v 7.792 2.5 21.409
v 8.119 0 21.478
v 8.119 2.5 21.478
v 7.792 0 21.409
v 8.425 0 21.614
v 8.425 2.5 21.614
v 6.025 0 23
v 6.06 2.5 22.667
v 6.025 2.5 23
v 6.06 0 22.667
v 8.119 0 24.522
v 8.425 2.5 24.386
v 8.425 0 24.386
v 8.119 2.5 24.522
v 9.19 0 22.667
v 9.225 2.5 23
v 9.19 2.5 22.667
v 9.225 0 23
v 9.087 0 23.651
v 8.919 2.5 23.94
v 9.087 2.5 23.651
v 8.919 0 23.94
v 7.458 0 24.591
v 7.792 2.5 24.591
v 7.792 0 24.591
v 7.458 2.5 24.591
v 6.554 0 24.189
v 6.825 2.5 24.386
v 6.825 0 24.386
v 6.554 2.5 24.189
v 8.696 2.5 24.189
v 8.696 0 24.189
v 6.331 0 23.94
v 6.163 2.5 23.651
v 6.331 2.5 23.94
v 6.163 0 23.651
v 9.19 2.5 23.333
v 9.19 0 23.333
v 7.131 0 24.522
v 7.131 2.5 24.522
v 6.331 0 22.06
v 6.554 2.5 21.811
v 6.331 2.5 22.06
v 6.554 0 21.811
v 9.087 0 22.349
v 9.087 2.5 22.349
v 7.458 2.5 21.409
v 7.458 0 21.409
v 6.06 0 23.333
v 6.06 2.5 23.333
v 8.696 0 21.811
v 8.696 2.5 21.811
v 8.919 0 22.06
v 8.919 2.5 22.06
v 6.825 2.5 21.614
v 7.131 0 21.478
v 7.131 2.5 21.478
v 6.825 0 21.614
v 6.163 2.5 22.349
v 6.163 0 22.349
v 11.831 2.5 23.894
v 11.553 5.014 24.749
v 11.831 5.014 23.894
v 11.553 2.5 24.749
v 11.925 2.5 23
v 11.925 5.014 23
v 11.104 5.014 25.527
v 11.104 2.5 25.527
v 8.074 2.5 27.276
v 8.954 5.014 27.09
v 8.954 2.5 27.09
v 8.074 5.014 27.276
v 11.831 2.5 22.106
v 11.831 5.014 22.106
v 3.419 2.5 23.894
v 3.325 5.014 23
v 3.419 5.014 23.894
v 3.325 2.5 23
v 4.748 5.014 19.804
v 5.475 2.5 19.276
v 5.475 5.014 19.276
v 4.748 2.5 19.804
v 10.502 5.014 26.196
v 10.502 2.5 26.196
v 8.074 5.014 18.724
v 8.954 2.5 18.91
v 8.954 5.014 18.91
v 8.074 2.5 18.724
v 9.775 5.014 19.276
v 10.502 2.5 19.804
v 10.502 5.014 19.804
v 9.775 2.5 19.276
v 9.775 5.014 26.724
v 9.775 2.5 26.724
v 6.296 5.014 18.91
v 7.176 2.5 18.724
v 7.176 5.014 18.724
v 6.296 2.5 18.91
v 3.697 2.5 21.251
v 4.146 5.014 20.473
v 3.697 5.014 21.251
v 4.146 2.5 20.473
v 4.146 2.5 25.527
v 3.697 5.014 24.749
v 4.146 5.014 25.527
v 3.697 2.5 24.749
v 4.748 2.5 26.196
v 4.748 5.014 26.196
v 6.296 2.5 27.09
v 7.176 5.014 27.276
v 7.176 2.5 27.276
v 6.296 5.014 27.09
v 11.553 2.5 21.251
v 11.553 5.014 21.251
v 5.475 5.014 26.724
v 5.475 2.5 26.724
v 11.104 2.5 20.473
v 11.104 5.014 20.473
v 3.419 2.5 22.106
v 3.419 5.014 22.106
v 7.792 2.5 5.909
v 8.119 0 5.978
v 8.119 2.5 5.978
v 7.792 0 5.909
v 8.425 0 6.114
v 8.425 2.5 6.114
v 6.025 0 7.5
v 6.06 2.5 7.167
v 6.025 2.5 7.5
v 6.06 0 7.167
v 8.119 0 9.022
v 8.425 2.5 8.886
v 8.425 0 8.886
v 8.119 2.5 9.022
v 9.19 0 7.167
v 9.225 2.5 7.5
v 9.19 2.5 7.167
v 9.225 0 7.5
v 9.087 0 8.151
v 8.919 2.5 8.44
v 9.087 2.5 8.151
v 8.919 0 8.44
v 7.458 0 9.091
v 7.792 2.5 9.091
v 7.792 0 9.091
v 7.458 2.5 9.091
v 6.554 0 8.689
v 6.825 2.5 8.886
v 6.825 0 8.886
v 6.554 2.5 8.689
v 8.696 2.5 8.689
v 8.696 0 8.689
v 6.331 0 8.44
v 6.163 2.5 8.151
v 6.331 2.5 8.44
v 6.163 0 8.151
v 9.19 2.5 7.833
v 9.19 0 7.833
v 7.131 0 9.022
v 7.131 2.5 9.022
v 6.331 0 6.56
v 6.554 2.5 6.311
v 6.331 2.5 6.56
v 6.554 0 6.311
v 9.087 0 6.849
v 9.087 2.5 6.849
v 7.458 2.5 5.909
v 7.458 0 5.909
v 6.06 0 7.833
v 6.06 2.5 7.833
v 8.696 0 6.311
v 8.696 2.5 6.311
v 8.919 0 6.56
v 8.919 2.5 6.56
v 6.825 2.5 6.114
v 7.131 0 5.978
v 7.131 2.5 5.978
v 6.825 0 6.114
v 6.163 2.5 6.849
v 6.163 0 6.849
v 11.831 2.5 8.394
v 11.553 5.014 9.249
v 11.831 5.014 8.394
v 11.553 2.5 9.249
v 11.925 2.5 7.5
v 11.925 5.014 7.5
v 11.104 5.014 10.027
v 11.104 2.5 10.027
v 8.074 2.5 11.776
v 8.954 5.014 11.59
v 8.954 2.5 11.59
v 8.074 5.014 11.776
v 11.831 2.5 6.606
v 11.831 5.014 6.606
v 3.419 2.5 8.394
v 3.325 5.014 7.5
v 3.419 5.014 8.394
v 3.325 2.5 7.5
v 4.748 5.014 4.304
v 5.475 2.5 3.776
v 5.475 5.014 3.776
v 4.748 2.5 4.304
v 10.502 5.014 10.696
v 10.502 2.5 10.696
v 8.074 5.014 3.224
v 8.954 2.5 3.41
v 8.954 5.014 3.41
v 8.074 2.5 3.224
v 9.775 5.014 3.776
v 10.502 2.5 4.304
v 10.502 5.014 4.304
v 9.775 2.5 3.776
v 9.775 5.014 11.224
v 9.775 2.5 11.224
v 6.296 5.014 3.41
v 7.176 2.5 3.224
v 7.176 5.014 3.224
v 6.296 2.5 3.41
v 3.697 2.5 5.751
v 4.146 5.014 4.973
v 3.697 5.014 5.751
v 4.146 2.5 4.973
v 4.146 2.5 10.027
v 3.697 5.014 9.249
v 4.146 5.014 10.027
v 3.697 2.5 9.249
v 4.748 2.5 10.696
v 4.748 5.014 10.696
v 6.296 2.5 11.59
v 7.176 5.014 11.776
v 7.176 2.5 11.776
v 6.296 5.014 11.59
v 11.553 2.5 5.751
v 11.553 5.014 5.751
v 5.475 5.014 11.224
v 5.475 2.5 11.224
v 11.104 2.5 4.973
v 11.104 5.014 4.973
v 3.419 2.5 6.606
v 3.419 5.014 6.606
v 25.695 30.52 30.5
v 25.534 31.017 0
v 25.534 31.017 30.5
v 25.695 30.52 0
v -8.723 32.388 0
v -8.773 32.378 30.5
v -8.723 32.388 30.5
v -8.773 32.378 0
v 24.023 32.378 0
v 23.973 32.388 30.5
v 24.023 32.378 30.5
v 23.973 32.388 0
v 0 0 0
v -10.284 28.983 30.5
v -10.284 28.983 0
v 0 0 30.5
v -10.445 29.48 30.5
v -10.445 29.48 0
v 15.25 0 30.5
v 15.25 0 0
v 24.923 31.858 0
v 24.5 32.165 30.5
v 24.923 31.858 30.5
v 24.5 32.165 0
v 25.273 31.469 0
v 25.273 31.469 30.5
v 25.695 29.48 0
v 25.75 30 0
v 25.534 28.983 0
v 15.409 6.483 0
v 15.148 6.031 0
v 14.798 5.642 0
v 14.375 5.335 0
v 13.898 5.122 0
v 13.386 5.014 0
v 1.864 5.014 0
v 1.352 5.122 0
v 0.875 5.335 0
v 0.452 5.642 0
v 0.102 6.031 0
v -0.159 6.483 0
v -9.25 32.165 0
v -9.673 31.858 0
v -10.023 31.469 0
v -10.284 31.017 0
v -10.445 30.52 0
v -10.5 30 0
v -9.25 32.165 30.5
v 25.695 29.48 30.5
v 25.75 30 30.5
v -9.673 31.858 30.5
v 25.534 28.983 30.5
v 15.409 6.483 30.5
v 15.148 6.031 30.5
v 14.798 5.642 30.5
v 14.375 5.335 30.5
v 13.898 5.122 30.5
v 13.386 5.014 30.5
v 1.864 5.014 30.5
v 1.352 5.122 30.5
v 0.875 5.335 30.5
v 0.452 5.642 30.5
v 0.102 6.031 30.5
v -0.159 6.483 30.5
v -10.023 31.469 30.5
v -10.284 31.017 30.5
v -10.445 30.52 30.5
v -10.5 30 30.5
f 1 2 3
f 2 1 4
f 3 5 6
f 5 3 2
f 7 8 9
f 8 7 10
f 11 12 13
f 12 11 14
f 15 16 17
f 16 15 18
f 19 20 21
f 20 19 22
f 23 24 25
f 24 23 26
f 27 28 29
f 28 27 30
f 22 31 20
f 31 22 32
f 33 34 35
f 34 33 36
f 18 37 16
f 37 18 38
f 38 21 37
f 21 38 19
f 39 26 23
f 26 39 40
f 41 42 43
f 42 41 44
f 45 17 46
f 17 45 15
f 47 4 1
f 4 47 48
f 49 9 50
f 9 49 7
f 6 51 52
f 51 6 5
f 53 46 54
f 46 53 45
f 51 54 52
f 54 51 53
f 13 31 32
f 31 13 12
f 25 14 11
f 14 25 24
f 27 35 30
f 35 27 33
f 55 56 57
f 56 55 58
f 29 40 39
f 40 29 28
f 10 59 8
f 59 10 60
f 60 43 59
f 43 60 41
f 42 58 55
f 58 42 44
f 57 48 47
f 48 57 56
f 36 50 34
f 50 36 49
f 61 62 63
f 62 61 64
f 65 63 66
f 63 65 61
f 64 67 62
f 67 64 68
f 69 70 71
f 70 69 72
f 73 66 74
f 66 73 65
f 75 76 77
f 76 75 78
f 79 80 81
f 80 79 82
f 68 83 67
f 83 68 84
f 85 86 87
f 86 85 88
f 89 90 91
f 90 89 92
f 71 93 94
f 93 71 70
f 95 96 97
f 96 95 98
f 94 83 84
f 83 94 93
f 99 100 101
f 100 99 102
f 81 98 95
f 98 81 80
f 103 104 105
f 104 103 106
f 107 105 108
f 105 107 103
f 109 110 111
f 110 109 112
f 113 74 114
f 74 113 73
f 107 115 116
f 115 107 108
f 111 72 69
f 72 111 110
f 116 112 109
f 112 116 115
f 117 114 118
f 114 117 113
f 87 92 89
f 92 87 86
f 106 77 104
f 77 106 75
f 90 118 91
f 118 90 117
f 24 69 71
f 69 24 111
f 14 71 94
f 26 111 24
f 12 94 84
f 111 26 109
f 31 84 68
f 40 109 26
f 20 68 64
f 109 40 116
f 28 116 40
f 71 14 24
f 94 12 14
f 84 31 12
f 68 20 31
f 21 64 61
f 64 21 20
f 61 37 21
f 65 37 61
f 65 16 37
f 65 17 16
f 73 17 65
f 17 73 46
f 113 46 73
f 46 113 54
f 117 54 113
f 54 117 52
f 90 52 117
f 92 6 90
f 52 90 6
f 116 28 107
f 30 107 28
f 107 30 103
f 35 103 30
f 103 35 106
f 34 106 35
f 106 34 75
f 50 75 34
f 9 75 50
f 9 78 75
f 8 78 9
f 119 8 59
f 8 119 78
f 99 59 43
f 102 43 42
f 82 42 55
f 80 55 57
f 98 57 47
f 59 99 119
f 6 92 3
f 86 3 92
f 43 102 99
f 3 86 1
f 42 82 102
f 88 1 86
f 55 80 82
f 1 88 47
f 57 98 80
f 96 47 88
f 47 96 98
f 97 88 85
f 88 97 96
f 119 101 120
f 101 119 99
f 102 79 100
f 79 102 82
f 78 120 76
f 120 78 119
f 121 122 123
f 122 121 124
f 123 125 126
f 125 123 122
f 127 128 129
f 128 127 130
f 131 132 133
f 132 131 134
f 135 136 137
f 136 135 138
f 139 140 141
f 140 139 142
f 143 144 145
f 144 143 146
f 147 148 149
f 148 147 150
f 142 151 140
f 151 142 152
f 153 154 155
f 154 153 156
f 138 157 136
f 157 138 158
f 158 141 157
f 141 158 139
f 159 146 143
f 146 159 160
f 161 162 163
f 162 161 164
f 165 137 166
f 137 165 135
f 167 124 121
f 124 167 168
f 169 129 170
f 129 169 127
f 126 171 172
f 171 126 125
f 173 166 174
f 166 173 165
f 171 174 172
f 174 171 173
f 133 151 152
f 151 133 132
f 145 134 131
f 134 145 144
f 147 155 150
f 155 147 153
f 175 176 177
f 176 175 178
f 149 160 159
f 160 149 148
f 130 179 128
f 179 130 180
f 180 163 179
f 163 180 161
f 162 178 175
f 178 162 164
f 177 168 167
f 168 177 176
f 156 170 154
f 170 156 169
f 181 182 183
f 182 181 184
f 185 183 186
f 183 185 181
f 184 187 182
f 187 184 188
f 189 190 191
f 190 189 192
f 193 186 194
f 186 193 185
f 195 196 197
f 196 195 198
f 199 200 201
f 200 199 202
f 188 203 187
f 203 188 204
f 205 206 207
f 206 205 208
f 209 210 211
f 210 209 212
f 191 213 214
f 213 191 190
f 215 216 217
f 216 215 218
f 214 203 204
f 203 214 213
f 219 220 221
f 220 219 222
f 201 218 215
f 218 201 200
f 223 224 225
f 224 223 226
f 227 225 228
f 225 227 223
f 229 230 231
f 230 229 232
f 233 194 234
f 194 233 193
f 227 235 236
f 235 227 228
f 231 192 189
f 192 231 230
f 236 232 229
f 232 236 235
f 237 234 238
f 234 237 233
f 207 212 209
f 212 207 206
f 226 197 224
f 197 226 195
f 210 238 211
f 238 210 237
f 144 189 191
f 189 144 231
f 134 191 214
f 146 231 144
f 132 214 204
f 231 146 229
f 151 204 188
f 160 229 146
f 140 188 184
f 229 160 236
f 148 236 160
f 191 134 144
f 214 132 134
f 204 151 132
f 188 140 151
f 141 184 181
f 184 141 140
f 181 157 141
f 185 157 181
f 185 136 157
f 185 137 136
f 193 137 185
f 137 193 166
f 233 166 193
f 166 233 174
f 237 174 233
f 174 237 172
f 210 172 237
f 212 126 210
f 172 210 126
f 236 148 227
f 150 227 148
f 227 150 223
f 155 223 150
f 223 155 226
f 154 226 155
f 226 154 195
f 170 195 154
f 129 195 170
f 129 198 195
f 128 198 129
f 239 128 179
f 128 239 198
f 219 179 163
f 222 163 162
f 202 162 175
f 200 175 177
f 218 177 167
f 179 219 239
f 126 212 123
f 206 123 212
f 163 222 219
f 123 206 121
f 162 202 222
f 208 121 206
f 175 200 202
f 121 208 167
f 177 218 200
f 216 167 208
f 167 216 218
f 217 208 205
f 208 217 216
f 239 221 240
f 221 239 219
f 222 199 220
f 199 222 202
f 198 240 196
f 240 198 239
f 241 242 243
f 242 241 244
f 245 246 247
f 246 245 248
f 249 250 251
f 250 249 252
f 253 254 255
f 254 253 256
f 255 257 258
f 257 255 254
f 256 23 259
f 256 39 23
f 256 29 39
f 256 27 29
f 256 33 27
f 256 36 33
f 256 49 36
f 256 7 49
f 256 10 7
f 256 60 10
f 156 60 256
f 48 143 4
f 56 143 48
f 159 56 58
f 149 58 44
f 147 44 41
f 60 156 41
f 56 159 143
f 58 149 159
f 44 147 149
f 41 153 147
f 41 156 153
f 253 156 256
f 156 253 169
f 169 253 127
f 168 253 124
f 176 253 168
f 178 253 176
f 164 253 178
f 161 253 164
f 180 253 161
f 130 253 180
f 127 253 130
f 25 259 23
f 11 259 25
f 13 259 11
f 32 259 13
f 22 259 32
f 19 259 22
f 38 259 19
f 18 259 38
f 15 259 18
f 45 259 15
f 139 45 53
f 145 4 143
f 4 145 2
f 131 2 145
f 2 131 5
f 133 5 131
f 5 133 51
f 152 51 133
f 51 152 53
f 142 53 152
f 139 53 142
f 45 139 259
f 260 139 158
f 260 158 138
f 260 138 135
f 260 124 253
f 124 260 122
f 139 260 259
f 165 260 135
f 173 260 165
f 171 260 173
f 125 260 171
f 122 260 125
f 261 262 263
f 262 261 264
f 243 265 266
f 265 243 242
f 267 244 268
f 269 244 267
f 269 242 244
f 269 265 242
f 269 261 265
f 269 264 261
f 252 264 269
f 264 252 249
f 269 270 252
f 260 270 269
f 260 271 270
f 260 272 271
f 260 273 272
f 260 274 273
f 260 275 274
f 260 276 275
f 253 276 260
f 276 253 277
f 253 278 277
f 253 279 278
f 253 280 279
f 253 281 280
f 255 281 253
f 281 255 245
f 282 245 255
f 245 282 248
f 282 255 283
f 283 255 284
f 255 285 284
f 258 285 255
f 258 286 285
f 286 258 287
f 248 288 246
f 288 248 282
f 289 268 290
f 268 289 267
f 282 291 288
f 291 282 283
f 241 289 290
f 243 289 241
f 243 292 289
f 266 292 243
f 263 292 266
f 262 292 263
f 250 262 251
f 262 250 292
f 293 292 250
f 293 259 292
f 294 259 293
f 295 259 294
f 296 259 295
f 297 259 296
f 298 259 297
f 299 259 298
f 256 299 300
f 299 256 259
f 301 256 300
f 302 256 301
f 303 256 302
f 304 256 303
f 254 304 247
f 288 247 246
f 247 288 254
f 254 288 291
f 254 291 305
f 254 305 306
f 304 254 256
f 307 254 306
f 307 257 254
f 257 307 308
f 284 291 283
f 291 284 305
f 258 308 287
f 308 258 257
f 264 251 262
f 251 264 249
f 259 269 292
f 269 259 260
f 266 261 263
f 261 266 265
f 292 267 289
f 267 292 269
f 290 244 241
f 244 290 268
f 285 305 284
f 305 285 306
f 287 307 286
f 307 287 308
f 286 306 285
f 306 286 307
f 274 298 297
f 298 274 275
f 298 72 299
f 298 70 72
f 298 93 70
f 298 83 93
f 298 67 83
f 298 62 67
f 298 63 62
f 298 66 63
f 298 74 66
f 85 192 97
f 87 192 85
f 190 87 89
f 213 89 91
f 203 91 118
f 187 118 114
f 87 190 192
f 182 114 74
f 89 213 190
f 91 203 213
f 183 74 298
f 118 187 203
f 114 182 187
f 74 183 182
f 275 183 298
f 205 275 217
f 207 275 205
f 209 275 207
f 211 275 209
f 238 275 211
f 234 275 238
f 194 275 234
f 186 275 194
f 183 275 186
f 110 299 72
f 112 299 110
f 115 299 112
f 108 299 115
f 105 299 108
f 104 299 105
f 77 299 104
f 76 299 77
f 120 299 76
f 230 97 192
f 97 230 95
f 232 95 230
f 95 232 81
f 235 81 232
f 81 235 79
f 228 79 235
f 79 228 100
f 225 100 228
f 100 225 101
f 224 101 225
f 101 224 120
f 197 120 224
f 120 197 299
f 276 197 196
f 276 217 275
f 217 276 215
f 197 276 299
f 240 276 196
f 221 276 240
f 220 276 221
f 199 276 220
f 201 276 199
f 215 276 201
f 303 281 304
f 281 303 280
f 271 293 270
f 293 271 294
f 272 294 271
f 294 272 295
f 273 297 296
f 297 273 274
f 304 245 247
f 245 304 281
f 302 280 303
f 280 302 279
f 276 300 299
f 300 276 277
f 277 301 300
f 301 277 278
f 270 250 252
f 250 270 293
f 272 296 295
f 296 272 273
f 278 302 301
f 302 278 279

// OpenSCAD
// file: ../parameters.scad
maximum_printable_size = 150;

layer_thickness = 0.3;
global_clearance = 0.5;


//Screw diameter and nut for M10 [mm]
M10_screw_diameter = 10.4;
M10_head_height = 10;
M10_head_diameter = 16+0.5;
M10_nut_height = 10.5;
M10_nut_diameter = 25.5;
M10_nut_pocket = 22.3;

//Screw diameter for M8 [mm]
M8_screw_diameter = 8.6;
M8_head_height = 8;
M8_head_diameter = 13.5;
M8_nut_height = 7.5;
M8_square_nut_thin_height = 4.5;
M8_nut_diameter = 14.4 + 0.5;
M8_nut_pocket = 13 + 0.5;
M8_washer_diameter = 16;
M8_washer_thickness = 1.5;


//Screw diameter and nut for M6 [mm]
M6_screw_diameter=6.5;
M6_head_diameter = 10+0.5;
M6_head_height = 6;
M6_nut_height = 4.9;
M6_nut_diameter = 11.8;
M6_nut_pocket = 10.4;
M6_square_nut_height = 3;
M6_square_nut_diameter = 10;
M6_washer_thickness = 1.6;

//Screw diameter and nut for M5 [mm]
M5_screw_diameter=5.5;
M5_head_height = 5;
M5_head_diameter = 13+0.5;
M5_nut_height = 4.5;
M5_nut_diameter = 9.4;
M5_nut_pocket = 8.4;

//Screw diameter and nut for M4 [mm]
M4_screw_diameter=4.5;
M4_screw_head_height = 4;
M4_nut_height = 3.2;
M4_nut_diameter = 8.4;
M4_nut_pocket = 7.5;

//Screw diameter and nut for M3 [mm]
M3_screw_diameter = 3.2;
M3_nut_height = 2.7;
M3_nut_diameter = 6.6;
M3_nut_pocket = 5.6;
M3_screw_head_height = 3;

//Screw diameter and nut for M2,5 [mm]
M2_5_screw_diameter = 2.7;
M2_5_nut_height = 2.3;
M2_5_nut_diameter = 6;
M2_5_nut_pocket = 5.5;

// kulove lozisko

bearing_efsm_08_h = 33+1;
bearing_efsm_08_m = 22;
bearing_efsm_08_db = 18;
bearing_efsm_08_ag = 10.5;
bearing_efsm_08_n = M4_screw_diameter;
bearing_efsm_08_a1 = 5.5;
bearing_efsm_08_d = 8.25;
bearing_efsm_08_B = 8; // ball height

bearing_efsm_10_h = 38+1;
bearing_efsm_10_m = 26;
bearing_efsm_10_db = 21.9;
bearing_efsm_10_ag = 12+0.2;
bearing_efsm_10_n = M5_screw_diameter;
bearing_efsm_10_a1 = 6.5;
bearing_efsm_10_d = 10.25;


bearing_efsm_12_width = 40+1;
bearing_efsm_12_h = bearing_efsm_12_width;
bearing_efsm_12_boltd = 28/2; // polovina vzdalenosti mezi srouby
bearing_efsm_12_m = bearing_efsm_12_boltd*2;
bearing_efsm_12_db = 25;
bearing_efsm_12_ag = 13;
bearing_efsm_12_a1 = 7;
bearing_efsm_12_n = M5_screw_diameter;
bearing_efsm_12_d = 12.15;
bearing_efsm_12_B = 10; // ball height
bearing_efsm_space = 1;

bearing_efsm_17_width = 54+1;
bearing_efsm_17_h = bearing_efsm_17_width;
bearing_efsm_17_boltd = 38/2; // polovina vzdalenosti mezi srouby
bearing_efsm_17_m = bearing_efsm_17_boltd*2;
bearing_efsm_17_db = 35;
bearing_efsm_17_ag = 18;
bearing_efsm_17_n = M6_screw_diameter;
bearing_efsm_17_a1 = 10;
bearing_efsm_17_B = 17; // ball height

//limcove lozisko
bearing_EFOM_10_L=26; //celkova sirka zakladny
bearing_EFOM_10_d1=10.3;//diametr otvoru real=10 mm
bearing_EFOM_10_dB=22;//diametr vystupku pro ulozeni lozika
bearing_EFOM_10_H=52;//celková delka zakladny
bearing_EFOM_10_J=36;// hole pitch
bearing_EFOM_10_A1=6.5;//vyska pouzdra
bearing_EFOM_10_Ag=12;//celkova vyska
bearing_EFOM_10_N1=5;//sirka otvoru pro sroub
bearing_EFOM_10_N2=8;//delka otvoru pro sroub
bearing_EFOM_10_m=36;//roztec der pro sroub
bearing_EFOM_10_h=9;//vyska lozika


608_bearing_outer_diameter = 22.3;
608_bearing_inner_diameter = 16;
608_bearing_thickness = 7.1;


// 20 KG servo parameters

servo_20kg_axis_offset = 9.375; // jak je osa mimo stredu
servo_20kg_body_x = 42;
servo_20kg_body_y = 21;
servo_20kg_body_z = 40;
servo_20kg_thread_x = 49/2;
servo_20kg_thread_y = 10/2;
servo_20kg_body_below = 10; // jak hluboko je tělo serva pod drzaky na srouby
servo_20kg_below = 25.8; // jak hluboko je páka serva pod drzaky na srouby

servo_20kg_bolt_d = 2.5+0.3;
servo_20kg_nut_d = 5+0.3;


//strain gauge
strain_gauge_width = 12.7;
strain_gauge_length = 75.1;
strain_gauge_screw_distance = 10;

//ALU profile
ALU_profile_width = 30.5;
ALU_profile_holder_wall_thickness = 3;
ALU_profile_groove_width = 8;

//pillow block bearing
//https://www.igus.eu/product/372
//Part no. KSTM-08
KSTM08_screws_distance = 33;         //m
KSTM08_screws_holes_diameter = 4.5;  //d2
KSTM08_flange_thickness = 6;         //h3
KSTM08_case_width = 9;               //C1
KSTM08_case_length = 47;             //a
KSTM08_ball_width = 12;              //B
KSTM08_ball_hole_diameter = 7.85;    //d1


//ložiska pro malý rotor
bearing_outer_diameter = 10.2;    // Rozměr B1 v nákresu s přídavkem na toleranci otvoru
bearing_thickness = 4;        // Rozměr B2 v nákresu
//bearing_shaft_length = 19.5;    // Rozměr B3 v nákresu, Originalni hodnota 19.5
bearing_shaft_length = 20;    // Rozměr B3 v nákresu


//simple platform parameters ////////////////////////////////////////////
front_holder_width = 160;
front_holder_angle = 25;
front_holder_height = 60;
front_holder_offset = 15;
front_holder_height_offset = 75;

// lock moving servo parameters
// static par.
servo_length = 23.1;
servo_width = 12.1;
servo_height = 26.7;
servo_axle_offset = 2.5;
servo_axle_height = 5;
servo_movement_angle = 40;
servo_movement_angle_offset = -10; // angle offset up
servo_force = 0.5; // [N/m] torque of servo

// dynamic par.
servo_arm_length = servo_width/2+ALU_profile_width/2+ALU_profile_holder_wall_thickness;
servo_travel_y = cos(servo_movement_angle)*servo_arm_length;
servo_arm_hole_length = (servo_arm_length/cos(servo_movement_angle+servo_movement_angle_offset))-servo_arm_length;
servo_joint_offset = sin(servo_movement_angle+servo_movement_angle_offset)*(servo_arm_length+servo_arm_hole_length+5);
servo_joint_offset_by_angle = -tan(servo_movement_angle_offset)*servo_arm_length;
servo_max_linear_force = servo_force/(servo_arm_length/1000); // max servo linear force [N]
servo_min_linear_force = cos(servo_movement_angle+abs(servo_movement_angle_offset))*servo_max_linear_force; // min servo linear force [N] in the most extreme position
servo_holding_linear_force = cos(servo_movement_angle+servo_movement_angle_offset)*servo_max_linear_force; // min servo linear force [N] in holding position

// lock static parameters
lock_screws_dia = 3.1;
lock_depth = 20;
lock_axle_diameter = 15;
lock_grab_axle_dia = 13;
lock_arms_joint_offset = 30;
lock_arms_joint_angle = 55;

// lock dynamic parameters
lock_push_force = (servo_holding_linear_force/cos(lock_arms_joint_angle))/cos(lock_arms_joint_angle); // lock arm pushing force on linear servo joint
lock_push_arm_length = tan(lock_arms_joint_angle)*lock_arms_joint_offset;
lock_arm_force_ratio = 1; // lock arm change holding force ratio (0.5 = arm will have half holding force)
lock_hold_arm_length = lock_push_arm_length/lock_arm_force_ratio;
lock_holding_force = lock_push_force*lock_arm_force_ratio;
lock_joint_arm_length = sqrt(pow(lock_push_arm_length, 2)+pow(lock_arms_joint_offset, 2));
// main file
include <../parameters.scad>



module 888_1003() {
	difference() {
		union() {
			hull() {
				cube([ALU_profile_width/2, 5, ALU_profile_width]);

				translate([ALU_profile_width/2+8, 30, 0])
				cylinder(d=5, h=ALU_profile_width, $fn=30);

				translate([-8, 30, 0])
				cylinder(d=5, h=ALU_profile_width, $fn=30);
			}
		}

		translate([0, 0, -1])
		hull() {
			translate([ALU_profile_width/4-5.5, 7.5, 0])
			cylinder(d=5, h=ALU_profile_width+2, $fn=30);

			translate([ALU_profile_width/4+5.5, 7.5, 0])
			cylinder(d=5, h=ALU_profile_width+2, $fn=30);

			translate([ALU_profile_width/2+6, 40, 0])
			cylinder(d=10, h=ALU_profile_width+2, $fn=30);

			translate([-6, 40, 0])
			cylinder(d=10, h=ALU_profile_width+2, $fn=30);
		}


		translate([ALU_profile_width/4, 12.5, ALU_profile_width-7.5])
		rotate([90, 0, 0])
		union() {
			cylinder(d=M3_screw_diameter, h=30, $fn=30);

			translate([0, 0, -20])
			cylinder(d=M3_nut_diameter+2, h=30, $fn=30);
		}

		translate([ALU_profile_width/4, 12.5, 7.5])
		rotate([90, 0, 0])
		union() {
			cylinder(d=M3_screw_diameter, h=30, $fn=30);

			translate([0, 0, -20])
			cylinder(d=M3_nut_diameter+2, h=30, $fn=30);
		}
	}
}

888_1003();
